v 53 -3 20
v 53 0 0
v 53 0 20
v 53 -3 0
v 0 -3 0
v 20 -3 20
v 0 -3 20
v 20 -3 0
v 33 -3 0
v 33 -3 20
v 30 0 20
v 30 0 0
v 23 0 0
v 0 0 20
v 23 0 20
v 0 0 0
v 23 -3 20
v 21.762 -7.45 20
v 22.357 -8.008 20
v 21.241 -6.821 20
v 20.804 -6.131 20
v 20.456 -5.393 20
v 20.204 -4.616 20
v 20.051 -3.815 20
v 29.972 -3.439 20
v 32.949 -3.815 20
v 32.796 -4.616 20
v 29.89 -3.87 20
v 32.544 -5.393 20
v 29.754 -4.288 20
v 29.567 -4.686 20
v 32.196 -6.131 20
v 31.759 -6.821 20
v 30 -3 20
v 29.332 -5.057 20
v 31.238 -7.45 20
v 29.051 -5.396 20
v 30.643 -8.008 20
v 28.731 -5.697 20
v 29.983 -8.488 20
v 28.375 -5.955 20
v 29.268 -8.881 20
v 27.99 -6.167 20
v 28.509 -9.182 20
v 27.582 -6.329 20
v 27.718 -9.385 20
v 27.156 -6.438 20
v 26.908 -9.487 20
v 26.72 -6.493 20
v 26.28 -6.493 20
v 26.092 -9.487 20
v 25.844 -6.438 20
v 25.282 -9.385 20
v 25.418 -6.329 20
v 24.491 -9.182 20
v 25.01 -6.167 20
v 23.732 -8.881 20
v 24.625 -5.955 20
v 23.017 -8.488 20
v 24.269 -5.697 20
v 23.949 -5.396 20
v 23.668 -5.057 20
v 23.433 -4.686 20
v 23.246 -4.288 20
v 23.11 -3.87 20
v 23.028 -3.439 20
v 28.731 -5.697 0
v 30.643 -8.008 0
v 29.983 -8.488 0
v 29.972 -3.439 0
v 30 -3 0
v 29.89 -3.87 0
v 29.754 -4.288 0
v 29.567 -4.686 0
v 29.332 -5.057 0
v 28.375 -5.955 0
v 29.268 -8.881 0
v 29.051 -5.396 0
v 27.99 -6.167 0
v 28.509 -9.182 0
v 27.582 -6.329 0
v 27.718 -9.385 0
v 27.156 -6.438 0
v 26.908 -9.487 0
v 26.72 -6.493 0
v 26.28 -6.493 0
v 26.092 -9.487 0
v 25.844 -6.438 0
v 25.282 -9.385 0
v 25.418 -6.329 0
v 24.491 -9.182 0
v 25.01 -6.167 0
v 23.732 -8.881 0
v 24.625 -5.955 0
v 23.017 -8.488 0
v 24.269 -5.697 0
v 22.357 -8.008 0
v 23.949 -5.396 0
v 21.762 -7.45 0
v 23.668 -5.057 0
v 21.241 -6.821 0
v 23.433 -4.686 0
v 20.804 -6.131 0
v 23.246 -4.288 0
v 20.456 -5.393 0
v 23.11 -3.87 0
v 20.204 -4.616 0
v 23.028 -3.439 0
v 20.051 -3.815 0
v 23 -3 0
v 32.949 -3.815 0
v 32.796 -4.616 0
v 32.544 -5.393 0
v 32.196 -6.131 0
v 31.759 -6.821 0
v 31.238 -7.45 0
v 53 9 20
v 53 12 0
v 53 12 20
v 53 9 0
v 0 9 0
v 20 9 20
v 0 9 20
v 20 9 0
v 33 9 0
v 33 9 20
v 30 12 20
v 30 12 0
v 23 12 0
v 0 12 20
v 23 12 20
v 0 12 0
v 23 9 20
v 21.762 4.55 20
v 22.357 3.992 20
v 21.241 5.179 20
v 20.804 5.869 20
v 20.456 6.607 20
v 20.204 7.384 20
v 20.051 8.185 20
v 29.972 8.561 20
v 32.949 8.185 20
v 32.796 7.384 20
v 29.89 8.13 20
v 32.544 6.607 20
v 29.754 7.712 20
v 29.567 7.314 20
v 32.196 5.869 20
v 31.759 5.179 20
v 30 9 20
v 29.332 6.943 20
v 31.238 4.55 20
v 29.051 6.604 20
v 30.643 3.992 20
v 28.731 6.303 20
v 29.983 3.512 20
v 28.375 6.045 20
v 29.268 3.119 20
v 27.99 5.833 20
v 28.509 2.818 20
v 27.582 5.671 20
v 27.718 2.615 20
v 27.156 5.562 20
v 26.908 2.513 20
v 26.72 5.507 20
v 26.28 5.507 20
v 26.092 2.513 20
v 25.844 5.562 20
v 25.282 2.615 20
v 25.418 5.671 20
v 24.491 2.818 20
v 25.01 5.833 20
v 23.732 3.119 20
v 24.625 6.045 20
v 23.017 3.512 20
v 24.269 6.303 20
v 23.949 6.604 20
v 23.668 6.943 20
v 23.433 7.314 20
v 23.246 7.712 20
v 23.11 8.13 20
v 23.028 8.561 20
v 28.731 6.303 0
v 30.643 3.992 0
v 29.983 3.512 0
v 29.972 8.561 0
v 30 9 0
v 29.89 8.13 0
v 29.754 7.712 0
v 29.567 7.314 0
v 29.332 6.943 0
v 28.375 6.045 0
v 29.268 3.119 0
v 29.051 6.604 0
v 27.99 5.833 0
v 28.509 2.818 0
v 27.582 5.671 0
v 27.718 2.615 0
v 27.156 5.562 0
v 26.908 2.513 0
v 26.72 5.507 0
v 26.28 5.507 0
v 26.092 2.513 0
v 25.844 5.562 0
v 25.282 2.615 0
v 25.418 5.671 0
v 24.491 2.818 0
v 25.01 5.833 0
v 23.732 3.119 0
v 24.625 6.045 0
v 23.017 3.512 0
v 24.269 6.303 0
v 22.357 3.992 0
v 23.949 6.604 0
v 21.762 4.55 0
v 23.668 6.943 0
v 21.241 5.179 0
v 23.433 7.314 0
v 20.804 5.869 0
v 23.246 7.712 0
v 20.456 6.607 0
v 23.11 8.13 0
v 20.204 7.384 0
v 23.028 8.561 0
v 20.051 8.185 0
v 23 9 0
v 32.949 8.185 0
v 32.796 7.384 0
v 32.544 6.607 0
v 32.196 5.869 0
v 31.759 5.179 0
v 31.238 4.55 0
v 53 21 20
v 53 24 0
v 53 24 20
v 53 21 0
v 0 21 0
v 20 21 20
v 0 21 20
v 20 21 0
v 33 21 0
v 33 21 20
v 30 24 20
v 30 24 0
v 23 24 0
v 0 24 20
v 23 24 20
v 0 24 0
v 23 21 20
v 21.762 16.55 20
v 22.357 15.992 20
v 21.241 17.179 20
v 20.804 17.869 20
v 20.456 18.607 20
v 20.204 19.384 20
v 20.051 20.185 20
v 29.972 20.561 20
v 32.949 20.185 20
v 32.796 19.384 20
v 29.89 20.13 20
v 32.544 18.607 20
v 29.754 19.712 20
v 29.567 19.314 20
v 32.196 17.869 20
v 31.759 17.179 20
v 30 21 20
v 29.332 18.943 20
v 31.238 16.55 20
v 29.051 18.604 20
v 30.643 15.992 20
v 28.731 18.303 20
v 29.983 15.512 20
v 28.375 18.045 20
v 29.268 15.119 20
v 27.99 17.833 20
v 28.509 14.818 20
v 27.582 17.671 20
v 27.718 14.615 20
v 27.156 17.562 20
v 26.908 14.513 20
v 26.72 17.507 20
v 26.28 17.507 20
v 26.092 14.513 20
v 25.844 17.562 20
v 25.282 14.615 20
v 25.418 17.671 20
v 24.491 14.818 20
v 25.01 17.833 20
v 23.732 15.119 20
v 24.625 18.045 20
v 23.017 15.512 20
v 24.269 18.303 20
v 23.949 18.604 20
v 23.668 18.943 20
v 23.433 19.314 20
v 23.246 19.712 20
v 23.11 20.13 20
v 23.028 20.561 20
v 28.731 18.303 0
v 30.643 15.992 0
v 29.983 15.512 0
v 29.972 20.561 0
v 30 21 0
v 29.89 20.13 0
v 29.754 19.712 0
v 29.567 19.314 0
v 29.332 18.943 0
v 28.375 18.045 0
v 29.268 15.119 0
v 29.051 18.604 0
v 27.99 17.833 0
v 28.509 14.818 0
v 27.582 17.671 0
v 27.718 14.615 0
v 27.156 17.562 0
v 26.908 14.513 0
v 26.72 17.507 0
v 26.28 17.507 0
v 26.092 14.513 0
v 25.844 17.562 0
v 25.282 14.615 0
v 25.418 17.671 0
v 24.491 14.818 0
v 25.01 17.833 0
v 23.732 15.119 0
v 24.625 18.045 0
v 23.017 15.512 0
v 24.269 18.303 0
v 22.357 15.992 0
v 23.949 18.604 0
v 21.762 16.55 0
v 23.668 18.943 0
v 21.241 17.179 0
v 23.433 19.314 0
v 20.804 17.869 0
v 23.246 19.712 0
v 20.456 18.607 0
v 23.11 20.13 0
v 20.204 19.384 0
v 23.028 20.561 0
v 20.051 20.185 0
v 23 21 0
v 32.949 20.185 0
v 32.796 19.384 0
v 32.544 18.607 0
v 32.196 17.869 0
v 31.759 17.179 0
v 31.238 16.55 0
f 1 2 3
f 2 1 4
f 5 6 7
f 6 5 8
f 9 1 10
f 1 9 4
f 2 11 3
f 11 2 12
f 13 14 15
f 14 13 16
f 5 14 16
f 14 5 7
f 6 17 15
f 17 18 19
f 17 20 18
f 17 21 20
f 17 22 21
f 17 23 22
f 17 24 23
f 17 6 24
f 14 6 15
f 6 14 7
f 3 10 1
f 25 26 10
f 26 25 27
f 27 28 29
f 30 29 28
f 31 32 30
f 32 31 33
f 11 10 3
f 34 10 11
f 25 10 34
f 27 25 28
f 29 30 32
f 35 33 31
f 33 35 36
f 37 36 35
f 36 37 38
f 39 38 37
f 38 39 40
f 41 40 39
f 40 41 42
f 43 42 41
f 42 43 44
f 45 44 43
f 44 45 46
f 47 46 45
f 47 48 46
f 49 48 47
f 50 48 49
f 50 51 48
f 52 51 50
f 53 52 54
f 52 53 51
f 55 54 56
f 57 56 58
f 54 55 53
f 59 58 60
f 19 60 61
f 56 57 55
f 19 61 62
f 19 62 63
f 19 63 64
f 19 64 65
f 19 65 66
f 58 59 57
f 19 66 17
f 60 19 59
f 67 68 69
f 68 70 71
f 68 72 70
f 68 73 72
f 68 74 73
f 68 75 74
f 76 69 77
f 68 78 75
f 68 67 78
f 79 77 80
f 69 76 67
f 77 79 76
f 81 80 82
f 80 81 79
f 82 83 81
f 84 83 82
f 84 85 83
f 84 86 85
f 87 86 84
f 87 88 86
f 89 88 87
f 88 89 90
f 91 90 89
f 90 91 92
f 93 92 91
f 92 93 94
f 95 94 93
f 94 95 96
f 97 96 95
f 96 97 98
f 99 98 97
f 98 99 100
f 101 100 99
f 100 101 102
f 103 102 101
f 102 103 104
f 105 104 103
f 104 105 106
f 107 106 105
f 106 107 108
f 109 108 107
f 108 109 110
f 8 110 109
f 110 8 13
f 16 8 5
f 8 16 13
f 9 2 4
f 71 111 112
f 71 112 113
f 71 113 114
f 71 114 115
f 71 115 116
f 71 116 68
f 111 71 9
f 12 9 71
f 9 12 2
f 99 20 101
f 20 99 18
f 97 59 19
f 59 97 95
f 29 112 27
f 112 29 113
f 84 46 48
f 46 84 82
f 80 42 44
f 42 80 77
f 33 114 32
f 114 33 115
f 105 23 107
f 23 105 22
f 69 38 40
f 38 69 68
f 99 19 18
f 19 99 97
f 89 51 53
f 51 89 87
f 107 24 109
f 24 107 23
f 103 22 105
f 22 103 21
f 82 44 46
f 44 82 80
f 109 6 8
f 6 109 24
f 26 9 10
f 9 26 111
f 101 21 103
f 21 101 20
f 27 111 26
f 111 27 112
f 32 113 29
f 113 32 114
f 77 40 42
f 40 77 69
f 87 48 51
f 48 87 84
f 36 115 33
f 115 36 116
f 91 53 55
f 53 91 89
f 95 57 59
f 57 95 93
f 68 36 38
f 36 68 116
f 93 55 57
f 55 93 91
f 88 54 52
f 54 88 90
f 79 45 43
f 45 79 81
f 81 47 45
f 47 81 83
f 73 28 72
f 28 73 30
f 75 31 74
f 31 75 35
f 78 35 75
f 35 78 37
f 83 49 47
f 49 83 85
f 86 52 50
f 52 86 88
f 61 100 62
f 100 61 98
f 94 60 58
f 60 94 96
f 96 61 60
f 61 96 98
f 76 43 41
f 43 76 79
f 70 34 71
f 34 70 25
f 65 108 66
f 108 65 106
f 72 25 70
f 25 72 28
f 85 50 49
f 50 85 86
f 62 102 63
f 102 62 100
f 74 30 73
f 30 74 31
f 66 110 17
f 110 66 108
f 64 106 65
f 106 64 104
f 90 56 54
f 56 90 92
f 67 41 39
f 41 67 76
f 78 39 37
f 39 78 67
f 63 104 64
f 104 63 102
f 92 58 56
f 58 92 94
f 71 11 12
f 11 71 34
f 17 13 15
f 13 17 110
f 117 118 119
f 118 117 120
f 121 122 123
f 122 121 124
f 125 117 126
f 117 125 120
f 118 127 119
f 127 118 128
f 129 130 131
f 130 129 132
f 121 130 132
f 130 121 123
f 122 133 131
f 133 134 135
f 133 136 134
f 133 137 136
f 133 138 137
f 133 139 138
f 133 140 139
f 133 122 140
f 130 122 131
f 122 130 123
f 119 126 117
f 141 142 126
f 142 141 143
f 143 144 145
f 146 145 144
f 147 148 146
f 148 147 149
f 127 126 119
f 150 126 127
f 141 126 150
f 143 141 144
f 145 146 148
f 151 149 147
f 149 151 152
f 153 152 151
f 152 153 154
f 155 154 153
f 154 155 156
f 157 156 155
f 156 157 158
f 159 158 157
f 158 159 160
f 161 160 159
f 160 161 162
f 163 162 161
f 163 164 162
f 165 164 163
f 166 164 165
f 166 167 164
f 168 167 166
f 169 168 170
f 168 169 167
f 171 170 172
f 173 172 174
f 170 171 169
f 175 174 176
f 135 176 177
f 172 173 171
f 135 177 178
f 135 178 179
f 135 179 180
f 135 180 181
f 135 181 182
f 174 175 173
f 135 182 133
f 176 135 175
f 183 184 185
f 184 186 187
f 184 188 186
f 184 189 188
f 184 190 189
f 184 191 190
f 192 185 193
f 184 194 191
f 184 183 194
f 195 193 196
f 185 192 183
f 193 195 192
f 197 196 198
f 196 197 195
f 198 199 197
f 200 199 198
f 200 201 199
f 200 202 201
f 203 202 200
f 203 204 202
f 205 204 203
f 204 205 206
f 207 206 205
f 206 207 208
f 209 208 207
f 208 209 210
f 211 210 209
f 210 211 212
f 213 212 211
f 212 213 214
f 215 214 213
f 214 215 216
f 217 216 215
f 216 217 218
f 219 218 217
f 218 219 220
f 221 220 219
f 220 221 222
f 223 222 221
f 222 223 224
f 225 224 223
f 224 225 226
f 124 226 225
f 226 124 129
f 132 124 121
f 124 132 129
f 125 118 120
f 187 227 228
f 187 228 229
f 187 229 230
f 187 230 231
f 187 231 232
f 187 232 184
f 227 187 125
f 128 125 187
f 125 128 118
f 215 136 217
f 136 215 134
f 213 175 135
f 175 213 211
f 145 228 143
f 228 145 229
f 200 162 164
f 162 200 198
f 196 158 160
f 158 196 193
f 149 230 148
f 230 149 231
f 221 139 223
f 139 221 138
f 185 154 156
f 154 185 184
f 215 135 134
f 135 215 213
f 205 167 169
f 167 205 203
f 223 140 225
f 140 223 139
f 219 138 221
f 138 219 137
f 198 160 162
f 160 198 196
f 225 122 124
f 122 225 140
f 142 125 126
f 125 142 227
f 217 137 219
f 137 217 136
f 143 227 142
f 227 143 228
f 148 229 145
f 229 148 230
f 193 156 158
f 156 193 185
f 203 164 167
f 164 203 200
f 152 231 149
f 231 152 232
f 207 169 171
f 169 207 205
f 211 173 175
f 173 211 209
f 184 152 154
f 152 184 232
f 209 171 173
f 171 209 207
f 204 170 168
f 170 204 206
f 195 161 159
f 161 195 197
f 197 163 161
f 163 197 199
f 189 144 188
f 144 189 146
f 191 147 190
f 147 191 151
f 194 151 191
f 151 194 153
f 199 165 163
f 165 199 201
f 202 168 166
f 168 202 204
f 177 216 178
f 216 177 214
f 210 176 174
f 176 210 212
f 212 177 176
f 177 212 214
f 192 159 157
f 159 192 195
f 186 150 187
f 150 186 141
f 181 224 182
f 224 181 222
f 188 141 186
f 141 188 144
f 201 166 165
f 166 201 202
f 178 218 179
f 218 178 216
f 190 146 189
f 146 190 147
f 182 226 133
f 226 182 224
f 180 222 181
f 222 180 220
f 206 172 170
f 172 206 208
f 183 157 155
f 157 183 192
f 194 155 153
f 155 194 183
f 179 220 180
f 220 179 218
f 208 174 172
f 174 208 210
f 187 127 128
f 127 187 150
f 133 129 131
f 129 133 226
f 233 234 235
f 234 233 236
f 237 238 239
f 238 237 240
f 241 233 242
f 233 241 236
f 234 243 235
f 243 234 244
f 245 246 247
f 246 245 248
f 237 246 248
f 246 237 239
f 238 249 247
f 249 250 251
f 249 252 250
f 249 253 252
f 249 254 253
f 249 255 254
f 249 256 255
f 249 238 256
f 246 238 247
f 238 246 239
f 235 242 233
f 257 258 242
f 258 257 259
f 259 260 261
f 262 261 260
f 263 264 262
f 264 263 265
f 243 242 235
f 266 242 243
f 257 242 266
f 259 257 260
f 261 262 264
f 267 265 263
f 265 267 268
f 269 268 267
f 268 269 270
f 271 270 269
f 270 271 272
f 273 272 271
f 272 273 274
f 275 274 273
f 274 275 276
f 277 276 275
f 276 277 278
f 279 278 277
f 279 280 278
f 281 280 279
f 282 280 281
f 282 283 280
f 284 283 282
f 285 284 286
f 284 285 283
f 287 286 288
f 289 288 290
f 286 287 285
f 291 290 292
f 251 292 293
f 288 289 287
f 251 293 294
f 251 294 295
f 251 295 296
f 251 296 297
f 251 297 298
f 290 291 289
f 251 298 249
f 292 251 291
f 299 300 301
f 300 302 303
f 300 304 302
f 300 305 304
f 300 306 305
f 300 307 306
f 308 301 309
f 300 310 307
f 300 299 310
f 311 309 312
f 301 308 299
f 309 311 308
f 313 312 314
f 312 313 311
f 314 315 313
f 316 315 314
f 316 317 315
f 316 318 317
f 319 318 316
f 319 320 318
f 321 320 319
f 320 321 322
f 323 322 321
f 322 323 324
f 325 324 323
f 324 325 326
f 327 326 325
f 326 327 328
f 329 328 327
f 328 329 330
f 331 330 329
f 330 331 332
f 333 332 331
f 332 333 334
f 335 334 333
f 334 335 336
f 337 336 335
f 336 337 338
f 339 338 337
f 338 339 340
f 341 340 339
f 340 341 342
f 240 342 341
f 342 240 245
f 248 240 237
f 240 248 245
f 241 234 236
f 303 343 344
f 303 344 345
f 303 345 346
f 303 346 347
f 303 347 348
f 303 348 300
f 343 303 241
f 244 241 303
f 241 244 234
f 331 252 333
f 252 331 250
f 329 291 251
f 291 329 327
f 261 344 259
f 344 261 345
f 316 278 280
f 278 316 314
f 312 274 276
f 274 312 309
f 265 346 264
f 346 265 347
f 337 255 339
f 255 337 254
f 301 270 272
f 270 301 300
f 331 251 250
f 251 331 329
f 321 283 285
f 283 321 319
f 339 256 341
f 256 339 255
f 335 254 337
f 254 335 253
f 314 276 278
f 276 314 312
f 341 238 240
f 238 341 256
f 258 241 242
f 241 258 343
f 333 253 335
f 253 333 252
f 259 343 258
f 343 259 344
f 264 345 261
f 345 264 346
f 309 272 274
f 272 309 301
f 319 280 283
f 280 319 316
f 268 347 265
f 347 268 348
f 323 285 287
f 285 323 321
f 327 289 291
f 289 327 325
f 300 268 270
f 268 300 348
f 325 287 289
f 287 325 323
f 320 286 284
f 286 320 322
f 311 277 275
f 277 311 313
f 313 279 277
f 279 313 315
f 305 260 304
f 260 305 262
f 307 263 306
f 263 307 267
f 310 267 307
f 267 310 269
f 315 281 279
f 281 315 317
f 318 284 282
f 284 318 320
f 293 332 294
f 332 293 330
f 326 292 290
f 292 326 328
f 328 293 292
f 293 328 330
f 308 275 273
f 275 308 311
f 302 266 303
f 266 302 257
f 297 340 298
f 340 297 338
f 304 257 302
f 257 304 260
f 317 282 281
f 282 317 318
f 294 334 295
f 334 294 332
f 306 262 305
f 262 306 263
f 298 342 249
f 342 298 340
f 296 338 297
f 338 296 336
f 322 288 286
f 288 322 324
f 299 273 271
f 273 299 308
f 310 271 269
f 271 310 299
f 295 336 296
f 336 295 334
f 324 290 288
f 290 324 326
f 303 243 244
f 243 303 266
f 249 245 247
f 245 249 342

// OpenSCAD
module _support_impl()
{
  thick=3;
  d=7+2*thick;
  ox=2*20+d;
  difference()
  {
    union()
    {
      cube([ox, 20, thick]);
      translate([ox/2, 0, thick])
        rotate([-90, 0, 0])
          cylinder(r=d/2, h=20, $fn=50);
    }
    translate([ox/2, 0, thick])
    {
      rotate([-90, 0, 0])
        cylinder(r=d/2-thick, h=20, $fn=50);
      translate([-(d-2*thick)/2, 0, -10])
        cube([d-2*thick, 20, 10]);
    }
    translate([0,0,-10])
      cube([ox, 20, 10]);
  }
}

module support()
{
  rotate([90, 0, 0])
    _support_impl();
}

for(i=[0:2])
  translate(i*[0, 12, 0])
    support();
